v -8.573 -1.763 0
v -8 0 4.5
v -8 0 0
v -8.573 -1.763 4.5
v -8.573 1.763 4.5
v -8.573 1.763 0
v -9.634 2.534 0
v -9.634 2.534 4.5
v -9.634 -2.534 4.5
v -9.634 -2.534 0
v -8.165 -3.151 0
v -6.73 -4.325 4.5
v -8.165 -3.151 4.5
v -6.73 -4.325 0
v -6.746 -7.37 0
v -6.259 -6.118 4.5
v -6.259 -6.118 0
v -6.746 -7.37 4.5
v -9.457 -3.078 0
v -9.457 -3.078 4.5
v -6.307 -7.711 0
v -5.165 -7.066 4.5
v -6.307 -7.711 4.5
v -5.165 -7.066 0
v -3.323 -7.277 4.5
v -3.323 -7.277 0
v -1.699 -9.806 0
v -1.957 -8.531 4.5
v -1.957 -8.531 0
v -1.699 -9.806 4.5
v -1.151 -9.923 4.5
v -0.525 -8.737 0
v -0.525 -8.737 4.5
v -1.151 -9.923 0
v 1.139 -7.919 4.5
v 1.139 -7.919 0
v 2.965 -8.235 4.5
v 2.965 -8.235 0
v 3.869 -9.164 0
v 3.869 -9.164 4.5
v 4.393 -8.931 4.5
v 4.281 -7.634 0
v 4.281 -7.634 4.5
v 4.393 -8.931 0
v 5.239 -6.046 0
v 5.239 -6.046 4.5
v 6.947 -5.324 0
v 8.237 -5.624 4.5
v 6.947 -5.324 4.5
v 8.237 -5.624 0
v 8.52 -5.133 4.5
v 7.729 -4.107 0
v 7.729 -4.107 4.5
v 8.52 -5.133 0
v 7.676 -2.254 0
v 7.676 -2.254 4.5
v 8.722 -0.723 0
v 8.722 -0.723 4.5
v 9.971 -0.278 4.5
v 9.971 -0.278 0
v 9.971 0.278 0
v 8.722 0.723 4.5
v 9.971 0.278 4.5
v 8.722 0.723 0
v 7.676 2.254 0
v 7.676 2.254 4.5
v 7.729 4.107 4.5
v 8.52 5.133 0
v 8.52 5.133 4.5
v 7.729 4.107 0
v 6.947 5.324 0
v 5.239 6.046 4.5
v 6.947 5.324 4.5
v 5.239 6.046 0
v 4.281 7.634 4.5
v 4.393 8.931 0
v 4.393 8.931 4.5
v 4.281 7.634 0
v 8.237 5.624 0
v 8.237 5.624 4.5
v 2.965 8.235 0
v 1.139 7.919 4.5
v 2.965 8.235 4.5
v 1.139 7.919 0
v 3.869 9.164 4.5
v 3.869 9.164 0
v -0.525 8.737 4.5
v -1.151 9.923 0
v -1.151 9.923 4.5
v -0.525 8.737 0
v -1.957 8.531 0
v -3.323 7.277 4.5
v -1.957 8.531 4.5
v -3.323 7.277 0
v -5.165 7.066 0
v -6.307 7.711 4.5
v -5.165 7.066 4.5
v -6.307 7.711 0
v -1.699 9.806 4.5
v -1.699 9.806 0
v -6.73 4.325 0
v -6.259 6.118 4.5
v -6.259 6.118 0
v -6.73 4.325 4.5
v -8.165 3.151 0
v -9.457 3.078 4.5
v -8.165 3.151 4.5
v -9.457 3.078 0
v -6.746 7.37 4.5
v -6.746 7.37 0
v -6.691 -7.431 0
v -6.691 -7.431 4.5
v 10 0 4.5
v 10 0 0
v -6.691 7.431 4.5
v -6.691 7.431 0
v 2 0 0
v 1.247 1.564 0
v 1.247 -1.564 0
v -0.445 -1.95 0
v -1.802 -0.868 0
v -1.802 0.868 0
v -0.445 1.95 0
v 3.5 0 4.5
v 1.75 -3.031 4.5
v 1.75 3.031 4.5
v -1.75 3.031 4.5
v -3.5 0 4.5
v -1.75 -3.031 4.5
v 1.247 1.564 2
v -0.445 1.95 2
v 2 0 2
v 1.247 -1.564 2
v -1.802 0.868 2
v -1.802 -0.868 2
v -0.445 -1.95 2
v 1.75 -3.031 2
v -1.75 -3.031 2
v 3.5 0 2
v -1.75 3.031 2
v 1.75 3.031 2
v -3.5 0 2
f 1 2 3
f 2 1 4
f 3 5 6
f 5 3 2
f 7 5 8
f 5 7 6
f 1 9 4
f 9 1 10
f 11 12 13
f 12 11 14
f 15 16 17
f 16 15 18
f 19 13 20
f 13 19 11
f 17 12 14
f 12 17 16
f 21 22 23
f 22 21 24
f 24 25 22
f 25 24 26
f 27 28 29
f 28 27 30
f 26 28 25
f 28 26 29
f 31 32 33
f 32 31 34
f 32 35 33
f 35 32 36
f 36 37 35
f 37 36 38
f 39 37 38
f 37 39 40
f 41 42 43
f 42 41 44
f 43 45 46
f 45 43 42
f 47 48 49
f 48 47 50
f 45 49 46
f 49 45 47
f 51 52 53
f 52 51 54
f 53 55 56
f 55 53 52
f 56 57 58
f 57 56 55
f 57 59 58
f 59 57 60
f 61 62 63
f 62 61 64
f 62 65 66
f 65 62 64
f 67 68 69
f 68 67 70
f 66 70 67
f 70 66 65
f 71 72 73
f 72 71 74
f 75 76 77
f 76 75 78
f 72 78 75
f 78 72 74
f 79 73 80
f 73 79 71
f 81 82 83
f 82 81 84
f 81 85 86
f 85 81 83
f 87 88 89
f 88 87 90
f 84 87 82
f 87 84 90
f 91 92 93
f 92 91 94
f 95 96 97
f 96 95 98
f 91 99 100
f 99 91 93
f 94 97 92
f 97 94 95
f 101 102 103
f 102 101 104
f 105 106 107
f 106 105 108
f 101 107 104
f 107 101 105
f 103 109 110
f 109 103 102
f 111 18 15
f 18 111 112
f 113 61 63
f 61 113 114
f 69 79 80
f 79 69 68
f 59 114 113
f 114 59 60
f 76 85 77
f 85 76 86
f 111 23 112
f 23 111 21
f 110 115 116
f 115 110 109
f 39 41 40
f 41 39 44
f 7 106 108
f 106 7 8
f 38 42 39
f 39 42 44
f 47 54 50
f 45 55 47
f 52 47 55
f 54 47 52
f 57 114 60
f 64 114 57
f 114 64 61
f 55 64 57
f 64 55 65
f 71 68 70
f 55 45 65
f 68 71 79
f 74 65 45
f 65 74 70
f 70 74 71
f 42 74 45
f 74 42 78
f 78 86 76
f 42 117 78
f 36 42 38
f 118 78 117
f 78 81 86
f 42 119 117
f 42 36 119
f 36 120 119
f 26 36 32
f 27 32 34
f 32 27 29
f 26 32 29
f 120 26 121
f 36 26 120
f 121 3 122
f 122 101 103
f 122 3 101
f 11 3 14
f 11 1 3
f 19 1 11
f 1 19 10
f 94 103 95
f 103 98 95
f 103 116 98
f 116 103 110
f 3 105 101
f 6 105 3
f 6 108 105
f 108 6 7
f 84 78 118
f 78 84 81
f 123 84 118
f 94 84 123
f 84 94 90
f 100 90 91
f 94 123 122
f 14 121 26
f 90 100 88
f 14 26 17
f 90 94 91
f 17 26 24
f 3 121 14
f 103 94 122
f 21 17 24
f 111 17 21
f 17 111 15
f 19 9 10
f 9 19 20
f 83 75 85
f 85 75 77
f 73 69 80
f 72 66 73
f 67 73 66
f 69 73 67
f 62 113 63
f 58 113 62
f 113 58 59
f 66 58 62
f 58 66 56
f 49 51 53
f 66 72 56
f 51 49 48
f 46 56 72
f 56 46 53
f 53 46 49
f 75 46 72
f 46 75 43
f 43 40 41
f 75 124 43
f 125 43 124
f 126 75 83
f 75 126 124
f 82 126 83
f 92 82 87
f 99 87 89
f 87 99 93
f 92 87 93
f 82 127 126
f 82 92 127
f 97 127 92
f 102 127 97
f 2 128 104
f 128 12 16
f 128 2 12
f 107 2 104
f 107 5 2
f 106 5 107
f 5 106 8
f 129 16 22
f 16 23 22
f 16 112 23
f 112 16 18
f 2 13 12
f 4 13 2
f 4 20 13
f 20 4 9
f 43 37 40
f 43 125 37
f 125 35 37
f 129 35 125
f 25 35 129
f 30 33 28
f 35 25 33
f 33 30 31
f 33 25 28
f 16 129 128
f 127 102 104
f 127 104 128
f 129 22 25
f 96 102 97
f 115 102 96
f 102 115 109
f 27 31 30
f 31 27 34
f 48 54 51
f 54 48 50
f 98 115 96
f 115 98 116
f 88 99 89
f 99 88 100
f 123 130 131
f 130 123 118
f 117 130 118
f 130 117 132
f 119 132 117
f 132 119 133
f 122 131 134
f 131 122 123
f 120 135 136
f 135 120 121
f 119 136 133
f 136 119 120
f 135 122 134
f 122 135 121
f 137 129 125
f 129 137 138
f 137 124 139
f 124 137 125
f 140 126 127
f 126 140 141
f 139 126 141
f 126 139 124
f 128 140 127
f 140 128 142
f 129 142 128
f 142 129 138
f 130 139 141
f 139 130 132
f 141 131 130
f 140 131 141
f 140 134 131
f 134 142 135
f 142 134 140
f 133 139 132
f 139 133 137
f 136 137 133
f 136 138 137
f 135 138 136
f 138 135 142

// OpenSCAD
// file: configure.scad
/*
 * file: configure.scad
 * author: gregor binder <gregor_reprap@catrix.at>
 * date: 10.11.2013
 * last change: 10.11.2013
 * license: CC BY-NC-SA 3.0
 */

nutheight=2.5;
nutdiagonal=7;
holediameter=4;
weeldiameter=20;
wallthickness=2;
gripcount=11;
griopheight=10;
gripradius=3;

outerdiametertestnut=14;
thicknesstestnut=2;
outerdiametertestnut=nutdiagonal+4;
// main file
/*
 * file: heatbed-adjuster.scad
 * author: gregor binder <gregor_reprap@catrix.at>
 * date: 10.11.2013
 * last change: 10.11.2013
 * license: CC BY-NC-SA 3.0
 */

include <configure.scad>;

module grip() {
	rotate([0,-90,0])
	for ( i = [0 : gripcount-1] ) {
		rotate( i * 360 / gripcount, [1, 0, 0])
			translate([0, 0, weeldiameter/2+1])
				rotate([0,90,0])
					cylinder(h=griopheight,r=gripradius);
	}
}



difference() {
	cylinder(h=nutheight+wallthickness,r=weeldiameter/2);
	translate([0,0,-1])
		cylinder(h=nutheight+wallthickness+5,r=holediameter/2);
	translate([0,0,wallthickness])
		cylinder(r = nutdiagonal/2, h=nutheight+5, $fn=6);
	translate([0,0,-1])
		grip();
}
